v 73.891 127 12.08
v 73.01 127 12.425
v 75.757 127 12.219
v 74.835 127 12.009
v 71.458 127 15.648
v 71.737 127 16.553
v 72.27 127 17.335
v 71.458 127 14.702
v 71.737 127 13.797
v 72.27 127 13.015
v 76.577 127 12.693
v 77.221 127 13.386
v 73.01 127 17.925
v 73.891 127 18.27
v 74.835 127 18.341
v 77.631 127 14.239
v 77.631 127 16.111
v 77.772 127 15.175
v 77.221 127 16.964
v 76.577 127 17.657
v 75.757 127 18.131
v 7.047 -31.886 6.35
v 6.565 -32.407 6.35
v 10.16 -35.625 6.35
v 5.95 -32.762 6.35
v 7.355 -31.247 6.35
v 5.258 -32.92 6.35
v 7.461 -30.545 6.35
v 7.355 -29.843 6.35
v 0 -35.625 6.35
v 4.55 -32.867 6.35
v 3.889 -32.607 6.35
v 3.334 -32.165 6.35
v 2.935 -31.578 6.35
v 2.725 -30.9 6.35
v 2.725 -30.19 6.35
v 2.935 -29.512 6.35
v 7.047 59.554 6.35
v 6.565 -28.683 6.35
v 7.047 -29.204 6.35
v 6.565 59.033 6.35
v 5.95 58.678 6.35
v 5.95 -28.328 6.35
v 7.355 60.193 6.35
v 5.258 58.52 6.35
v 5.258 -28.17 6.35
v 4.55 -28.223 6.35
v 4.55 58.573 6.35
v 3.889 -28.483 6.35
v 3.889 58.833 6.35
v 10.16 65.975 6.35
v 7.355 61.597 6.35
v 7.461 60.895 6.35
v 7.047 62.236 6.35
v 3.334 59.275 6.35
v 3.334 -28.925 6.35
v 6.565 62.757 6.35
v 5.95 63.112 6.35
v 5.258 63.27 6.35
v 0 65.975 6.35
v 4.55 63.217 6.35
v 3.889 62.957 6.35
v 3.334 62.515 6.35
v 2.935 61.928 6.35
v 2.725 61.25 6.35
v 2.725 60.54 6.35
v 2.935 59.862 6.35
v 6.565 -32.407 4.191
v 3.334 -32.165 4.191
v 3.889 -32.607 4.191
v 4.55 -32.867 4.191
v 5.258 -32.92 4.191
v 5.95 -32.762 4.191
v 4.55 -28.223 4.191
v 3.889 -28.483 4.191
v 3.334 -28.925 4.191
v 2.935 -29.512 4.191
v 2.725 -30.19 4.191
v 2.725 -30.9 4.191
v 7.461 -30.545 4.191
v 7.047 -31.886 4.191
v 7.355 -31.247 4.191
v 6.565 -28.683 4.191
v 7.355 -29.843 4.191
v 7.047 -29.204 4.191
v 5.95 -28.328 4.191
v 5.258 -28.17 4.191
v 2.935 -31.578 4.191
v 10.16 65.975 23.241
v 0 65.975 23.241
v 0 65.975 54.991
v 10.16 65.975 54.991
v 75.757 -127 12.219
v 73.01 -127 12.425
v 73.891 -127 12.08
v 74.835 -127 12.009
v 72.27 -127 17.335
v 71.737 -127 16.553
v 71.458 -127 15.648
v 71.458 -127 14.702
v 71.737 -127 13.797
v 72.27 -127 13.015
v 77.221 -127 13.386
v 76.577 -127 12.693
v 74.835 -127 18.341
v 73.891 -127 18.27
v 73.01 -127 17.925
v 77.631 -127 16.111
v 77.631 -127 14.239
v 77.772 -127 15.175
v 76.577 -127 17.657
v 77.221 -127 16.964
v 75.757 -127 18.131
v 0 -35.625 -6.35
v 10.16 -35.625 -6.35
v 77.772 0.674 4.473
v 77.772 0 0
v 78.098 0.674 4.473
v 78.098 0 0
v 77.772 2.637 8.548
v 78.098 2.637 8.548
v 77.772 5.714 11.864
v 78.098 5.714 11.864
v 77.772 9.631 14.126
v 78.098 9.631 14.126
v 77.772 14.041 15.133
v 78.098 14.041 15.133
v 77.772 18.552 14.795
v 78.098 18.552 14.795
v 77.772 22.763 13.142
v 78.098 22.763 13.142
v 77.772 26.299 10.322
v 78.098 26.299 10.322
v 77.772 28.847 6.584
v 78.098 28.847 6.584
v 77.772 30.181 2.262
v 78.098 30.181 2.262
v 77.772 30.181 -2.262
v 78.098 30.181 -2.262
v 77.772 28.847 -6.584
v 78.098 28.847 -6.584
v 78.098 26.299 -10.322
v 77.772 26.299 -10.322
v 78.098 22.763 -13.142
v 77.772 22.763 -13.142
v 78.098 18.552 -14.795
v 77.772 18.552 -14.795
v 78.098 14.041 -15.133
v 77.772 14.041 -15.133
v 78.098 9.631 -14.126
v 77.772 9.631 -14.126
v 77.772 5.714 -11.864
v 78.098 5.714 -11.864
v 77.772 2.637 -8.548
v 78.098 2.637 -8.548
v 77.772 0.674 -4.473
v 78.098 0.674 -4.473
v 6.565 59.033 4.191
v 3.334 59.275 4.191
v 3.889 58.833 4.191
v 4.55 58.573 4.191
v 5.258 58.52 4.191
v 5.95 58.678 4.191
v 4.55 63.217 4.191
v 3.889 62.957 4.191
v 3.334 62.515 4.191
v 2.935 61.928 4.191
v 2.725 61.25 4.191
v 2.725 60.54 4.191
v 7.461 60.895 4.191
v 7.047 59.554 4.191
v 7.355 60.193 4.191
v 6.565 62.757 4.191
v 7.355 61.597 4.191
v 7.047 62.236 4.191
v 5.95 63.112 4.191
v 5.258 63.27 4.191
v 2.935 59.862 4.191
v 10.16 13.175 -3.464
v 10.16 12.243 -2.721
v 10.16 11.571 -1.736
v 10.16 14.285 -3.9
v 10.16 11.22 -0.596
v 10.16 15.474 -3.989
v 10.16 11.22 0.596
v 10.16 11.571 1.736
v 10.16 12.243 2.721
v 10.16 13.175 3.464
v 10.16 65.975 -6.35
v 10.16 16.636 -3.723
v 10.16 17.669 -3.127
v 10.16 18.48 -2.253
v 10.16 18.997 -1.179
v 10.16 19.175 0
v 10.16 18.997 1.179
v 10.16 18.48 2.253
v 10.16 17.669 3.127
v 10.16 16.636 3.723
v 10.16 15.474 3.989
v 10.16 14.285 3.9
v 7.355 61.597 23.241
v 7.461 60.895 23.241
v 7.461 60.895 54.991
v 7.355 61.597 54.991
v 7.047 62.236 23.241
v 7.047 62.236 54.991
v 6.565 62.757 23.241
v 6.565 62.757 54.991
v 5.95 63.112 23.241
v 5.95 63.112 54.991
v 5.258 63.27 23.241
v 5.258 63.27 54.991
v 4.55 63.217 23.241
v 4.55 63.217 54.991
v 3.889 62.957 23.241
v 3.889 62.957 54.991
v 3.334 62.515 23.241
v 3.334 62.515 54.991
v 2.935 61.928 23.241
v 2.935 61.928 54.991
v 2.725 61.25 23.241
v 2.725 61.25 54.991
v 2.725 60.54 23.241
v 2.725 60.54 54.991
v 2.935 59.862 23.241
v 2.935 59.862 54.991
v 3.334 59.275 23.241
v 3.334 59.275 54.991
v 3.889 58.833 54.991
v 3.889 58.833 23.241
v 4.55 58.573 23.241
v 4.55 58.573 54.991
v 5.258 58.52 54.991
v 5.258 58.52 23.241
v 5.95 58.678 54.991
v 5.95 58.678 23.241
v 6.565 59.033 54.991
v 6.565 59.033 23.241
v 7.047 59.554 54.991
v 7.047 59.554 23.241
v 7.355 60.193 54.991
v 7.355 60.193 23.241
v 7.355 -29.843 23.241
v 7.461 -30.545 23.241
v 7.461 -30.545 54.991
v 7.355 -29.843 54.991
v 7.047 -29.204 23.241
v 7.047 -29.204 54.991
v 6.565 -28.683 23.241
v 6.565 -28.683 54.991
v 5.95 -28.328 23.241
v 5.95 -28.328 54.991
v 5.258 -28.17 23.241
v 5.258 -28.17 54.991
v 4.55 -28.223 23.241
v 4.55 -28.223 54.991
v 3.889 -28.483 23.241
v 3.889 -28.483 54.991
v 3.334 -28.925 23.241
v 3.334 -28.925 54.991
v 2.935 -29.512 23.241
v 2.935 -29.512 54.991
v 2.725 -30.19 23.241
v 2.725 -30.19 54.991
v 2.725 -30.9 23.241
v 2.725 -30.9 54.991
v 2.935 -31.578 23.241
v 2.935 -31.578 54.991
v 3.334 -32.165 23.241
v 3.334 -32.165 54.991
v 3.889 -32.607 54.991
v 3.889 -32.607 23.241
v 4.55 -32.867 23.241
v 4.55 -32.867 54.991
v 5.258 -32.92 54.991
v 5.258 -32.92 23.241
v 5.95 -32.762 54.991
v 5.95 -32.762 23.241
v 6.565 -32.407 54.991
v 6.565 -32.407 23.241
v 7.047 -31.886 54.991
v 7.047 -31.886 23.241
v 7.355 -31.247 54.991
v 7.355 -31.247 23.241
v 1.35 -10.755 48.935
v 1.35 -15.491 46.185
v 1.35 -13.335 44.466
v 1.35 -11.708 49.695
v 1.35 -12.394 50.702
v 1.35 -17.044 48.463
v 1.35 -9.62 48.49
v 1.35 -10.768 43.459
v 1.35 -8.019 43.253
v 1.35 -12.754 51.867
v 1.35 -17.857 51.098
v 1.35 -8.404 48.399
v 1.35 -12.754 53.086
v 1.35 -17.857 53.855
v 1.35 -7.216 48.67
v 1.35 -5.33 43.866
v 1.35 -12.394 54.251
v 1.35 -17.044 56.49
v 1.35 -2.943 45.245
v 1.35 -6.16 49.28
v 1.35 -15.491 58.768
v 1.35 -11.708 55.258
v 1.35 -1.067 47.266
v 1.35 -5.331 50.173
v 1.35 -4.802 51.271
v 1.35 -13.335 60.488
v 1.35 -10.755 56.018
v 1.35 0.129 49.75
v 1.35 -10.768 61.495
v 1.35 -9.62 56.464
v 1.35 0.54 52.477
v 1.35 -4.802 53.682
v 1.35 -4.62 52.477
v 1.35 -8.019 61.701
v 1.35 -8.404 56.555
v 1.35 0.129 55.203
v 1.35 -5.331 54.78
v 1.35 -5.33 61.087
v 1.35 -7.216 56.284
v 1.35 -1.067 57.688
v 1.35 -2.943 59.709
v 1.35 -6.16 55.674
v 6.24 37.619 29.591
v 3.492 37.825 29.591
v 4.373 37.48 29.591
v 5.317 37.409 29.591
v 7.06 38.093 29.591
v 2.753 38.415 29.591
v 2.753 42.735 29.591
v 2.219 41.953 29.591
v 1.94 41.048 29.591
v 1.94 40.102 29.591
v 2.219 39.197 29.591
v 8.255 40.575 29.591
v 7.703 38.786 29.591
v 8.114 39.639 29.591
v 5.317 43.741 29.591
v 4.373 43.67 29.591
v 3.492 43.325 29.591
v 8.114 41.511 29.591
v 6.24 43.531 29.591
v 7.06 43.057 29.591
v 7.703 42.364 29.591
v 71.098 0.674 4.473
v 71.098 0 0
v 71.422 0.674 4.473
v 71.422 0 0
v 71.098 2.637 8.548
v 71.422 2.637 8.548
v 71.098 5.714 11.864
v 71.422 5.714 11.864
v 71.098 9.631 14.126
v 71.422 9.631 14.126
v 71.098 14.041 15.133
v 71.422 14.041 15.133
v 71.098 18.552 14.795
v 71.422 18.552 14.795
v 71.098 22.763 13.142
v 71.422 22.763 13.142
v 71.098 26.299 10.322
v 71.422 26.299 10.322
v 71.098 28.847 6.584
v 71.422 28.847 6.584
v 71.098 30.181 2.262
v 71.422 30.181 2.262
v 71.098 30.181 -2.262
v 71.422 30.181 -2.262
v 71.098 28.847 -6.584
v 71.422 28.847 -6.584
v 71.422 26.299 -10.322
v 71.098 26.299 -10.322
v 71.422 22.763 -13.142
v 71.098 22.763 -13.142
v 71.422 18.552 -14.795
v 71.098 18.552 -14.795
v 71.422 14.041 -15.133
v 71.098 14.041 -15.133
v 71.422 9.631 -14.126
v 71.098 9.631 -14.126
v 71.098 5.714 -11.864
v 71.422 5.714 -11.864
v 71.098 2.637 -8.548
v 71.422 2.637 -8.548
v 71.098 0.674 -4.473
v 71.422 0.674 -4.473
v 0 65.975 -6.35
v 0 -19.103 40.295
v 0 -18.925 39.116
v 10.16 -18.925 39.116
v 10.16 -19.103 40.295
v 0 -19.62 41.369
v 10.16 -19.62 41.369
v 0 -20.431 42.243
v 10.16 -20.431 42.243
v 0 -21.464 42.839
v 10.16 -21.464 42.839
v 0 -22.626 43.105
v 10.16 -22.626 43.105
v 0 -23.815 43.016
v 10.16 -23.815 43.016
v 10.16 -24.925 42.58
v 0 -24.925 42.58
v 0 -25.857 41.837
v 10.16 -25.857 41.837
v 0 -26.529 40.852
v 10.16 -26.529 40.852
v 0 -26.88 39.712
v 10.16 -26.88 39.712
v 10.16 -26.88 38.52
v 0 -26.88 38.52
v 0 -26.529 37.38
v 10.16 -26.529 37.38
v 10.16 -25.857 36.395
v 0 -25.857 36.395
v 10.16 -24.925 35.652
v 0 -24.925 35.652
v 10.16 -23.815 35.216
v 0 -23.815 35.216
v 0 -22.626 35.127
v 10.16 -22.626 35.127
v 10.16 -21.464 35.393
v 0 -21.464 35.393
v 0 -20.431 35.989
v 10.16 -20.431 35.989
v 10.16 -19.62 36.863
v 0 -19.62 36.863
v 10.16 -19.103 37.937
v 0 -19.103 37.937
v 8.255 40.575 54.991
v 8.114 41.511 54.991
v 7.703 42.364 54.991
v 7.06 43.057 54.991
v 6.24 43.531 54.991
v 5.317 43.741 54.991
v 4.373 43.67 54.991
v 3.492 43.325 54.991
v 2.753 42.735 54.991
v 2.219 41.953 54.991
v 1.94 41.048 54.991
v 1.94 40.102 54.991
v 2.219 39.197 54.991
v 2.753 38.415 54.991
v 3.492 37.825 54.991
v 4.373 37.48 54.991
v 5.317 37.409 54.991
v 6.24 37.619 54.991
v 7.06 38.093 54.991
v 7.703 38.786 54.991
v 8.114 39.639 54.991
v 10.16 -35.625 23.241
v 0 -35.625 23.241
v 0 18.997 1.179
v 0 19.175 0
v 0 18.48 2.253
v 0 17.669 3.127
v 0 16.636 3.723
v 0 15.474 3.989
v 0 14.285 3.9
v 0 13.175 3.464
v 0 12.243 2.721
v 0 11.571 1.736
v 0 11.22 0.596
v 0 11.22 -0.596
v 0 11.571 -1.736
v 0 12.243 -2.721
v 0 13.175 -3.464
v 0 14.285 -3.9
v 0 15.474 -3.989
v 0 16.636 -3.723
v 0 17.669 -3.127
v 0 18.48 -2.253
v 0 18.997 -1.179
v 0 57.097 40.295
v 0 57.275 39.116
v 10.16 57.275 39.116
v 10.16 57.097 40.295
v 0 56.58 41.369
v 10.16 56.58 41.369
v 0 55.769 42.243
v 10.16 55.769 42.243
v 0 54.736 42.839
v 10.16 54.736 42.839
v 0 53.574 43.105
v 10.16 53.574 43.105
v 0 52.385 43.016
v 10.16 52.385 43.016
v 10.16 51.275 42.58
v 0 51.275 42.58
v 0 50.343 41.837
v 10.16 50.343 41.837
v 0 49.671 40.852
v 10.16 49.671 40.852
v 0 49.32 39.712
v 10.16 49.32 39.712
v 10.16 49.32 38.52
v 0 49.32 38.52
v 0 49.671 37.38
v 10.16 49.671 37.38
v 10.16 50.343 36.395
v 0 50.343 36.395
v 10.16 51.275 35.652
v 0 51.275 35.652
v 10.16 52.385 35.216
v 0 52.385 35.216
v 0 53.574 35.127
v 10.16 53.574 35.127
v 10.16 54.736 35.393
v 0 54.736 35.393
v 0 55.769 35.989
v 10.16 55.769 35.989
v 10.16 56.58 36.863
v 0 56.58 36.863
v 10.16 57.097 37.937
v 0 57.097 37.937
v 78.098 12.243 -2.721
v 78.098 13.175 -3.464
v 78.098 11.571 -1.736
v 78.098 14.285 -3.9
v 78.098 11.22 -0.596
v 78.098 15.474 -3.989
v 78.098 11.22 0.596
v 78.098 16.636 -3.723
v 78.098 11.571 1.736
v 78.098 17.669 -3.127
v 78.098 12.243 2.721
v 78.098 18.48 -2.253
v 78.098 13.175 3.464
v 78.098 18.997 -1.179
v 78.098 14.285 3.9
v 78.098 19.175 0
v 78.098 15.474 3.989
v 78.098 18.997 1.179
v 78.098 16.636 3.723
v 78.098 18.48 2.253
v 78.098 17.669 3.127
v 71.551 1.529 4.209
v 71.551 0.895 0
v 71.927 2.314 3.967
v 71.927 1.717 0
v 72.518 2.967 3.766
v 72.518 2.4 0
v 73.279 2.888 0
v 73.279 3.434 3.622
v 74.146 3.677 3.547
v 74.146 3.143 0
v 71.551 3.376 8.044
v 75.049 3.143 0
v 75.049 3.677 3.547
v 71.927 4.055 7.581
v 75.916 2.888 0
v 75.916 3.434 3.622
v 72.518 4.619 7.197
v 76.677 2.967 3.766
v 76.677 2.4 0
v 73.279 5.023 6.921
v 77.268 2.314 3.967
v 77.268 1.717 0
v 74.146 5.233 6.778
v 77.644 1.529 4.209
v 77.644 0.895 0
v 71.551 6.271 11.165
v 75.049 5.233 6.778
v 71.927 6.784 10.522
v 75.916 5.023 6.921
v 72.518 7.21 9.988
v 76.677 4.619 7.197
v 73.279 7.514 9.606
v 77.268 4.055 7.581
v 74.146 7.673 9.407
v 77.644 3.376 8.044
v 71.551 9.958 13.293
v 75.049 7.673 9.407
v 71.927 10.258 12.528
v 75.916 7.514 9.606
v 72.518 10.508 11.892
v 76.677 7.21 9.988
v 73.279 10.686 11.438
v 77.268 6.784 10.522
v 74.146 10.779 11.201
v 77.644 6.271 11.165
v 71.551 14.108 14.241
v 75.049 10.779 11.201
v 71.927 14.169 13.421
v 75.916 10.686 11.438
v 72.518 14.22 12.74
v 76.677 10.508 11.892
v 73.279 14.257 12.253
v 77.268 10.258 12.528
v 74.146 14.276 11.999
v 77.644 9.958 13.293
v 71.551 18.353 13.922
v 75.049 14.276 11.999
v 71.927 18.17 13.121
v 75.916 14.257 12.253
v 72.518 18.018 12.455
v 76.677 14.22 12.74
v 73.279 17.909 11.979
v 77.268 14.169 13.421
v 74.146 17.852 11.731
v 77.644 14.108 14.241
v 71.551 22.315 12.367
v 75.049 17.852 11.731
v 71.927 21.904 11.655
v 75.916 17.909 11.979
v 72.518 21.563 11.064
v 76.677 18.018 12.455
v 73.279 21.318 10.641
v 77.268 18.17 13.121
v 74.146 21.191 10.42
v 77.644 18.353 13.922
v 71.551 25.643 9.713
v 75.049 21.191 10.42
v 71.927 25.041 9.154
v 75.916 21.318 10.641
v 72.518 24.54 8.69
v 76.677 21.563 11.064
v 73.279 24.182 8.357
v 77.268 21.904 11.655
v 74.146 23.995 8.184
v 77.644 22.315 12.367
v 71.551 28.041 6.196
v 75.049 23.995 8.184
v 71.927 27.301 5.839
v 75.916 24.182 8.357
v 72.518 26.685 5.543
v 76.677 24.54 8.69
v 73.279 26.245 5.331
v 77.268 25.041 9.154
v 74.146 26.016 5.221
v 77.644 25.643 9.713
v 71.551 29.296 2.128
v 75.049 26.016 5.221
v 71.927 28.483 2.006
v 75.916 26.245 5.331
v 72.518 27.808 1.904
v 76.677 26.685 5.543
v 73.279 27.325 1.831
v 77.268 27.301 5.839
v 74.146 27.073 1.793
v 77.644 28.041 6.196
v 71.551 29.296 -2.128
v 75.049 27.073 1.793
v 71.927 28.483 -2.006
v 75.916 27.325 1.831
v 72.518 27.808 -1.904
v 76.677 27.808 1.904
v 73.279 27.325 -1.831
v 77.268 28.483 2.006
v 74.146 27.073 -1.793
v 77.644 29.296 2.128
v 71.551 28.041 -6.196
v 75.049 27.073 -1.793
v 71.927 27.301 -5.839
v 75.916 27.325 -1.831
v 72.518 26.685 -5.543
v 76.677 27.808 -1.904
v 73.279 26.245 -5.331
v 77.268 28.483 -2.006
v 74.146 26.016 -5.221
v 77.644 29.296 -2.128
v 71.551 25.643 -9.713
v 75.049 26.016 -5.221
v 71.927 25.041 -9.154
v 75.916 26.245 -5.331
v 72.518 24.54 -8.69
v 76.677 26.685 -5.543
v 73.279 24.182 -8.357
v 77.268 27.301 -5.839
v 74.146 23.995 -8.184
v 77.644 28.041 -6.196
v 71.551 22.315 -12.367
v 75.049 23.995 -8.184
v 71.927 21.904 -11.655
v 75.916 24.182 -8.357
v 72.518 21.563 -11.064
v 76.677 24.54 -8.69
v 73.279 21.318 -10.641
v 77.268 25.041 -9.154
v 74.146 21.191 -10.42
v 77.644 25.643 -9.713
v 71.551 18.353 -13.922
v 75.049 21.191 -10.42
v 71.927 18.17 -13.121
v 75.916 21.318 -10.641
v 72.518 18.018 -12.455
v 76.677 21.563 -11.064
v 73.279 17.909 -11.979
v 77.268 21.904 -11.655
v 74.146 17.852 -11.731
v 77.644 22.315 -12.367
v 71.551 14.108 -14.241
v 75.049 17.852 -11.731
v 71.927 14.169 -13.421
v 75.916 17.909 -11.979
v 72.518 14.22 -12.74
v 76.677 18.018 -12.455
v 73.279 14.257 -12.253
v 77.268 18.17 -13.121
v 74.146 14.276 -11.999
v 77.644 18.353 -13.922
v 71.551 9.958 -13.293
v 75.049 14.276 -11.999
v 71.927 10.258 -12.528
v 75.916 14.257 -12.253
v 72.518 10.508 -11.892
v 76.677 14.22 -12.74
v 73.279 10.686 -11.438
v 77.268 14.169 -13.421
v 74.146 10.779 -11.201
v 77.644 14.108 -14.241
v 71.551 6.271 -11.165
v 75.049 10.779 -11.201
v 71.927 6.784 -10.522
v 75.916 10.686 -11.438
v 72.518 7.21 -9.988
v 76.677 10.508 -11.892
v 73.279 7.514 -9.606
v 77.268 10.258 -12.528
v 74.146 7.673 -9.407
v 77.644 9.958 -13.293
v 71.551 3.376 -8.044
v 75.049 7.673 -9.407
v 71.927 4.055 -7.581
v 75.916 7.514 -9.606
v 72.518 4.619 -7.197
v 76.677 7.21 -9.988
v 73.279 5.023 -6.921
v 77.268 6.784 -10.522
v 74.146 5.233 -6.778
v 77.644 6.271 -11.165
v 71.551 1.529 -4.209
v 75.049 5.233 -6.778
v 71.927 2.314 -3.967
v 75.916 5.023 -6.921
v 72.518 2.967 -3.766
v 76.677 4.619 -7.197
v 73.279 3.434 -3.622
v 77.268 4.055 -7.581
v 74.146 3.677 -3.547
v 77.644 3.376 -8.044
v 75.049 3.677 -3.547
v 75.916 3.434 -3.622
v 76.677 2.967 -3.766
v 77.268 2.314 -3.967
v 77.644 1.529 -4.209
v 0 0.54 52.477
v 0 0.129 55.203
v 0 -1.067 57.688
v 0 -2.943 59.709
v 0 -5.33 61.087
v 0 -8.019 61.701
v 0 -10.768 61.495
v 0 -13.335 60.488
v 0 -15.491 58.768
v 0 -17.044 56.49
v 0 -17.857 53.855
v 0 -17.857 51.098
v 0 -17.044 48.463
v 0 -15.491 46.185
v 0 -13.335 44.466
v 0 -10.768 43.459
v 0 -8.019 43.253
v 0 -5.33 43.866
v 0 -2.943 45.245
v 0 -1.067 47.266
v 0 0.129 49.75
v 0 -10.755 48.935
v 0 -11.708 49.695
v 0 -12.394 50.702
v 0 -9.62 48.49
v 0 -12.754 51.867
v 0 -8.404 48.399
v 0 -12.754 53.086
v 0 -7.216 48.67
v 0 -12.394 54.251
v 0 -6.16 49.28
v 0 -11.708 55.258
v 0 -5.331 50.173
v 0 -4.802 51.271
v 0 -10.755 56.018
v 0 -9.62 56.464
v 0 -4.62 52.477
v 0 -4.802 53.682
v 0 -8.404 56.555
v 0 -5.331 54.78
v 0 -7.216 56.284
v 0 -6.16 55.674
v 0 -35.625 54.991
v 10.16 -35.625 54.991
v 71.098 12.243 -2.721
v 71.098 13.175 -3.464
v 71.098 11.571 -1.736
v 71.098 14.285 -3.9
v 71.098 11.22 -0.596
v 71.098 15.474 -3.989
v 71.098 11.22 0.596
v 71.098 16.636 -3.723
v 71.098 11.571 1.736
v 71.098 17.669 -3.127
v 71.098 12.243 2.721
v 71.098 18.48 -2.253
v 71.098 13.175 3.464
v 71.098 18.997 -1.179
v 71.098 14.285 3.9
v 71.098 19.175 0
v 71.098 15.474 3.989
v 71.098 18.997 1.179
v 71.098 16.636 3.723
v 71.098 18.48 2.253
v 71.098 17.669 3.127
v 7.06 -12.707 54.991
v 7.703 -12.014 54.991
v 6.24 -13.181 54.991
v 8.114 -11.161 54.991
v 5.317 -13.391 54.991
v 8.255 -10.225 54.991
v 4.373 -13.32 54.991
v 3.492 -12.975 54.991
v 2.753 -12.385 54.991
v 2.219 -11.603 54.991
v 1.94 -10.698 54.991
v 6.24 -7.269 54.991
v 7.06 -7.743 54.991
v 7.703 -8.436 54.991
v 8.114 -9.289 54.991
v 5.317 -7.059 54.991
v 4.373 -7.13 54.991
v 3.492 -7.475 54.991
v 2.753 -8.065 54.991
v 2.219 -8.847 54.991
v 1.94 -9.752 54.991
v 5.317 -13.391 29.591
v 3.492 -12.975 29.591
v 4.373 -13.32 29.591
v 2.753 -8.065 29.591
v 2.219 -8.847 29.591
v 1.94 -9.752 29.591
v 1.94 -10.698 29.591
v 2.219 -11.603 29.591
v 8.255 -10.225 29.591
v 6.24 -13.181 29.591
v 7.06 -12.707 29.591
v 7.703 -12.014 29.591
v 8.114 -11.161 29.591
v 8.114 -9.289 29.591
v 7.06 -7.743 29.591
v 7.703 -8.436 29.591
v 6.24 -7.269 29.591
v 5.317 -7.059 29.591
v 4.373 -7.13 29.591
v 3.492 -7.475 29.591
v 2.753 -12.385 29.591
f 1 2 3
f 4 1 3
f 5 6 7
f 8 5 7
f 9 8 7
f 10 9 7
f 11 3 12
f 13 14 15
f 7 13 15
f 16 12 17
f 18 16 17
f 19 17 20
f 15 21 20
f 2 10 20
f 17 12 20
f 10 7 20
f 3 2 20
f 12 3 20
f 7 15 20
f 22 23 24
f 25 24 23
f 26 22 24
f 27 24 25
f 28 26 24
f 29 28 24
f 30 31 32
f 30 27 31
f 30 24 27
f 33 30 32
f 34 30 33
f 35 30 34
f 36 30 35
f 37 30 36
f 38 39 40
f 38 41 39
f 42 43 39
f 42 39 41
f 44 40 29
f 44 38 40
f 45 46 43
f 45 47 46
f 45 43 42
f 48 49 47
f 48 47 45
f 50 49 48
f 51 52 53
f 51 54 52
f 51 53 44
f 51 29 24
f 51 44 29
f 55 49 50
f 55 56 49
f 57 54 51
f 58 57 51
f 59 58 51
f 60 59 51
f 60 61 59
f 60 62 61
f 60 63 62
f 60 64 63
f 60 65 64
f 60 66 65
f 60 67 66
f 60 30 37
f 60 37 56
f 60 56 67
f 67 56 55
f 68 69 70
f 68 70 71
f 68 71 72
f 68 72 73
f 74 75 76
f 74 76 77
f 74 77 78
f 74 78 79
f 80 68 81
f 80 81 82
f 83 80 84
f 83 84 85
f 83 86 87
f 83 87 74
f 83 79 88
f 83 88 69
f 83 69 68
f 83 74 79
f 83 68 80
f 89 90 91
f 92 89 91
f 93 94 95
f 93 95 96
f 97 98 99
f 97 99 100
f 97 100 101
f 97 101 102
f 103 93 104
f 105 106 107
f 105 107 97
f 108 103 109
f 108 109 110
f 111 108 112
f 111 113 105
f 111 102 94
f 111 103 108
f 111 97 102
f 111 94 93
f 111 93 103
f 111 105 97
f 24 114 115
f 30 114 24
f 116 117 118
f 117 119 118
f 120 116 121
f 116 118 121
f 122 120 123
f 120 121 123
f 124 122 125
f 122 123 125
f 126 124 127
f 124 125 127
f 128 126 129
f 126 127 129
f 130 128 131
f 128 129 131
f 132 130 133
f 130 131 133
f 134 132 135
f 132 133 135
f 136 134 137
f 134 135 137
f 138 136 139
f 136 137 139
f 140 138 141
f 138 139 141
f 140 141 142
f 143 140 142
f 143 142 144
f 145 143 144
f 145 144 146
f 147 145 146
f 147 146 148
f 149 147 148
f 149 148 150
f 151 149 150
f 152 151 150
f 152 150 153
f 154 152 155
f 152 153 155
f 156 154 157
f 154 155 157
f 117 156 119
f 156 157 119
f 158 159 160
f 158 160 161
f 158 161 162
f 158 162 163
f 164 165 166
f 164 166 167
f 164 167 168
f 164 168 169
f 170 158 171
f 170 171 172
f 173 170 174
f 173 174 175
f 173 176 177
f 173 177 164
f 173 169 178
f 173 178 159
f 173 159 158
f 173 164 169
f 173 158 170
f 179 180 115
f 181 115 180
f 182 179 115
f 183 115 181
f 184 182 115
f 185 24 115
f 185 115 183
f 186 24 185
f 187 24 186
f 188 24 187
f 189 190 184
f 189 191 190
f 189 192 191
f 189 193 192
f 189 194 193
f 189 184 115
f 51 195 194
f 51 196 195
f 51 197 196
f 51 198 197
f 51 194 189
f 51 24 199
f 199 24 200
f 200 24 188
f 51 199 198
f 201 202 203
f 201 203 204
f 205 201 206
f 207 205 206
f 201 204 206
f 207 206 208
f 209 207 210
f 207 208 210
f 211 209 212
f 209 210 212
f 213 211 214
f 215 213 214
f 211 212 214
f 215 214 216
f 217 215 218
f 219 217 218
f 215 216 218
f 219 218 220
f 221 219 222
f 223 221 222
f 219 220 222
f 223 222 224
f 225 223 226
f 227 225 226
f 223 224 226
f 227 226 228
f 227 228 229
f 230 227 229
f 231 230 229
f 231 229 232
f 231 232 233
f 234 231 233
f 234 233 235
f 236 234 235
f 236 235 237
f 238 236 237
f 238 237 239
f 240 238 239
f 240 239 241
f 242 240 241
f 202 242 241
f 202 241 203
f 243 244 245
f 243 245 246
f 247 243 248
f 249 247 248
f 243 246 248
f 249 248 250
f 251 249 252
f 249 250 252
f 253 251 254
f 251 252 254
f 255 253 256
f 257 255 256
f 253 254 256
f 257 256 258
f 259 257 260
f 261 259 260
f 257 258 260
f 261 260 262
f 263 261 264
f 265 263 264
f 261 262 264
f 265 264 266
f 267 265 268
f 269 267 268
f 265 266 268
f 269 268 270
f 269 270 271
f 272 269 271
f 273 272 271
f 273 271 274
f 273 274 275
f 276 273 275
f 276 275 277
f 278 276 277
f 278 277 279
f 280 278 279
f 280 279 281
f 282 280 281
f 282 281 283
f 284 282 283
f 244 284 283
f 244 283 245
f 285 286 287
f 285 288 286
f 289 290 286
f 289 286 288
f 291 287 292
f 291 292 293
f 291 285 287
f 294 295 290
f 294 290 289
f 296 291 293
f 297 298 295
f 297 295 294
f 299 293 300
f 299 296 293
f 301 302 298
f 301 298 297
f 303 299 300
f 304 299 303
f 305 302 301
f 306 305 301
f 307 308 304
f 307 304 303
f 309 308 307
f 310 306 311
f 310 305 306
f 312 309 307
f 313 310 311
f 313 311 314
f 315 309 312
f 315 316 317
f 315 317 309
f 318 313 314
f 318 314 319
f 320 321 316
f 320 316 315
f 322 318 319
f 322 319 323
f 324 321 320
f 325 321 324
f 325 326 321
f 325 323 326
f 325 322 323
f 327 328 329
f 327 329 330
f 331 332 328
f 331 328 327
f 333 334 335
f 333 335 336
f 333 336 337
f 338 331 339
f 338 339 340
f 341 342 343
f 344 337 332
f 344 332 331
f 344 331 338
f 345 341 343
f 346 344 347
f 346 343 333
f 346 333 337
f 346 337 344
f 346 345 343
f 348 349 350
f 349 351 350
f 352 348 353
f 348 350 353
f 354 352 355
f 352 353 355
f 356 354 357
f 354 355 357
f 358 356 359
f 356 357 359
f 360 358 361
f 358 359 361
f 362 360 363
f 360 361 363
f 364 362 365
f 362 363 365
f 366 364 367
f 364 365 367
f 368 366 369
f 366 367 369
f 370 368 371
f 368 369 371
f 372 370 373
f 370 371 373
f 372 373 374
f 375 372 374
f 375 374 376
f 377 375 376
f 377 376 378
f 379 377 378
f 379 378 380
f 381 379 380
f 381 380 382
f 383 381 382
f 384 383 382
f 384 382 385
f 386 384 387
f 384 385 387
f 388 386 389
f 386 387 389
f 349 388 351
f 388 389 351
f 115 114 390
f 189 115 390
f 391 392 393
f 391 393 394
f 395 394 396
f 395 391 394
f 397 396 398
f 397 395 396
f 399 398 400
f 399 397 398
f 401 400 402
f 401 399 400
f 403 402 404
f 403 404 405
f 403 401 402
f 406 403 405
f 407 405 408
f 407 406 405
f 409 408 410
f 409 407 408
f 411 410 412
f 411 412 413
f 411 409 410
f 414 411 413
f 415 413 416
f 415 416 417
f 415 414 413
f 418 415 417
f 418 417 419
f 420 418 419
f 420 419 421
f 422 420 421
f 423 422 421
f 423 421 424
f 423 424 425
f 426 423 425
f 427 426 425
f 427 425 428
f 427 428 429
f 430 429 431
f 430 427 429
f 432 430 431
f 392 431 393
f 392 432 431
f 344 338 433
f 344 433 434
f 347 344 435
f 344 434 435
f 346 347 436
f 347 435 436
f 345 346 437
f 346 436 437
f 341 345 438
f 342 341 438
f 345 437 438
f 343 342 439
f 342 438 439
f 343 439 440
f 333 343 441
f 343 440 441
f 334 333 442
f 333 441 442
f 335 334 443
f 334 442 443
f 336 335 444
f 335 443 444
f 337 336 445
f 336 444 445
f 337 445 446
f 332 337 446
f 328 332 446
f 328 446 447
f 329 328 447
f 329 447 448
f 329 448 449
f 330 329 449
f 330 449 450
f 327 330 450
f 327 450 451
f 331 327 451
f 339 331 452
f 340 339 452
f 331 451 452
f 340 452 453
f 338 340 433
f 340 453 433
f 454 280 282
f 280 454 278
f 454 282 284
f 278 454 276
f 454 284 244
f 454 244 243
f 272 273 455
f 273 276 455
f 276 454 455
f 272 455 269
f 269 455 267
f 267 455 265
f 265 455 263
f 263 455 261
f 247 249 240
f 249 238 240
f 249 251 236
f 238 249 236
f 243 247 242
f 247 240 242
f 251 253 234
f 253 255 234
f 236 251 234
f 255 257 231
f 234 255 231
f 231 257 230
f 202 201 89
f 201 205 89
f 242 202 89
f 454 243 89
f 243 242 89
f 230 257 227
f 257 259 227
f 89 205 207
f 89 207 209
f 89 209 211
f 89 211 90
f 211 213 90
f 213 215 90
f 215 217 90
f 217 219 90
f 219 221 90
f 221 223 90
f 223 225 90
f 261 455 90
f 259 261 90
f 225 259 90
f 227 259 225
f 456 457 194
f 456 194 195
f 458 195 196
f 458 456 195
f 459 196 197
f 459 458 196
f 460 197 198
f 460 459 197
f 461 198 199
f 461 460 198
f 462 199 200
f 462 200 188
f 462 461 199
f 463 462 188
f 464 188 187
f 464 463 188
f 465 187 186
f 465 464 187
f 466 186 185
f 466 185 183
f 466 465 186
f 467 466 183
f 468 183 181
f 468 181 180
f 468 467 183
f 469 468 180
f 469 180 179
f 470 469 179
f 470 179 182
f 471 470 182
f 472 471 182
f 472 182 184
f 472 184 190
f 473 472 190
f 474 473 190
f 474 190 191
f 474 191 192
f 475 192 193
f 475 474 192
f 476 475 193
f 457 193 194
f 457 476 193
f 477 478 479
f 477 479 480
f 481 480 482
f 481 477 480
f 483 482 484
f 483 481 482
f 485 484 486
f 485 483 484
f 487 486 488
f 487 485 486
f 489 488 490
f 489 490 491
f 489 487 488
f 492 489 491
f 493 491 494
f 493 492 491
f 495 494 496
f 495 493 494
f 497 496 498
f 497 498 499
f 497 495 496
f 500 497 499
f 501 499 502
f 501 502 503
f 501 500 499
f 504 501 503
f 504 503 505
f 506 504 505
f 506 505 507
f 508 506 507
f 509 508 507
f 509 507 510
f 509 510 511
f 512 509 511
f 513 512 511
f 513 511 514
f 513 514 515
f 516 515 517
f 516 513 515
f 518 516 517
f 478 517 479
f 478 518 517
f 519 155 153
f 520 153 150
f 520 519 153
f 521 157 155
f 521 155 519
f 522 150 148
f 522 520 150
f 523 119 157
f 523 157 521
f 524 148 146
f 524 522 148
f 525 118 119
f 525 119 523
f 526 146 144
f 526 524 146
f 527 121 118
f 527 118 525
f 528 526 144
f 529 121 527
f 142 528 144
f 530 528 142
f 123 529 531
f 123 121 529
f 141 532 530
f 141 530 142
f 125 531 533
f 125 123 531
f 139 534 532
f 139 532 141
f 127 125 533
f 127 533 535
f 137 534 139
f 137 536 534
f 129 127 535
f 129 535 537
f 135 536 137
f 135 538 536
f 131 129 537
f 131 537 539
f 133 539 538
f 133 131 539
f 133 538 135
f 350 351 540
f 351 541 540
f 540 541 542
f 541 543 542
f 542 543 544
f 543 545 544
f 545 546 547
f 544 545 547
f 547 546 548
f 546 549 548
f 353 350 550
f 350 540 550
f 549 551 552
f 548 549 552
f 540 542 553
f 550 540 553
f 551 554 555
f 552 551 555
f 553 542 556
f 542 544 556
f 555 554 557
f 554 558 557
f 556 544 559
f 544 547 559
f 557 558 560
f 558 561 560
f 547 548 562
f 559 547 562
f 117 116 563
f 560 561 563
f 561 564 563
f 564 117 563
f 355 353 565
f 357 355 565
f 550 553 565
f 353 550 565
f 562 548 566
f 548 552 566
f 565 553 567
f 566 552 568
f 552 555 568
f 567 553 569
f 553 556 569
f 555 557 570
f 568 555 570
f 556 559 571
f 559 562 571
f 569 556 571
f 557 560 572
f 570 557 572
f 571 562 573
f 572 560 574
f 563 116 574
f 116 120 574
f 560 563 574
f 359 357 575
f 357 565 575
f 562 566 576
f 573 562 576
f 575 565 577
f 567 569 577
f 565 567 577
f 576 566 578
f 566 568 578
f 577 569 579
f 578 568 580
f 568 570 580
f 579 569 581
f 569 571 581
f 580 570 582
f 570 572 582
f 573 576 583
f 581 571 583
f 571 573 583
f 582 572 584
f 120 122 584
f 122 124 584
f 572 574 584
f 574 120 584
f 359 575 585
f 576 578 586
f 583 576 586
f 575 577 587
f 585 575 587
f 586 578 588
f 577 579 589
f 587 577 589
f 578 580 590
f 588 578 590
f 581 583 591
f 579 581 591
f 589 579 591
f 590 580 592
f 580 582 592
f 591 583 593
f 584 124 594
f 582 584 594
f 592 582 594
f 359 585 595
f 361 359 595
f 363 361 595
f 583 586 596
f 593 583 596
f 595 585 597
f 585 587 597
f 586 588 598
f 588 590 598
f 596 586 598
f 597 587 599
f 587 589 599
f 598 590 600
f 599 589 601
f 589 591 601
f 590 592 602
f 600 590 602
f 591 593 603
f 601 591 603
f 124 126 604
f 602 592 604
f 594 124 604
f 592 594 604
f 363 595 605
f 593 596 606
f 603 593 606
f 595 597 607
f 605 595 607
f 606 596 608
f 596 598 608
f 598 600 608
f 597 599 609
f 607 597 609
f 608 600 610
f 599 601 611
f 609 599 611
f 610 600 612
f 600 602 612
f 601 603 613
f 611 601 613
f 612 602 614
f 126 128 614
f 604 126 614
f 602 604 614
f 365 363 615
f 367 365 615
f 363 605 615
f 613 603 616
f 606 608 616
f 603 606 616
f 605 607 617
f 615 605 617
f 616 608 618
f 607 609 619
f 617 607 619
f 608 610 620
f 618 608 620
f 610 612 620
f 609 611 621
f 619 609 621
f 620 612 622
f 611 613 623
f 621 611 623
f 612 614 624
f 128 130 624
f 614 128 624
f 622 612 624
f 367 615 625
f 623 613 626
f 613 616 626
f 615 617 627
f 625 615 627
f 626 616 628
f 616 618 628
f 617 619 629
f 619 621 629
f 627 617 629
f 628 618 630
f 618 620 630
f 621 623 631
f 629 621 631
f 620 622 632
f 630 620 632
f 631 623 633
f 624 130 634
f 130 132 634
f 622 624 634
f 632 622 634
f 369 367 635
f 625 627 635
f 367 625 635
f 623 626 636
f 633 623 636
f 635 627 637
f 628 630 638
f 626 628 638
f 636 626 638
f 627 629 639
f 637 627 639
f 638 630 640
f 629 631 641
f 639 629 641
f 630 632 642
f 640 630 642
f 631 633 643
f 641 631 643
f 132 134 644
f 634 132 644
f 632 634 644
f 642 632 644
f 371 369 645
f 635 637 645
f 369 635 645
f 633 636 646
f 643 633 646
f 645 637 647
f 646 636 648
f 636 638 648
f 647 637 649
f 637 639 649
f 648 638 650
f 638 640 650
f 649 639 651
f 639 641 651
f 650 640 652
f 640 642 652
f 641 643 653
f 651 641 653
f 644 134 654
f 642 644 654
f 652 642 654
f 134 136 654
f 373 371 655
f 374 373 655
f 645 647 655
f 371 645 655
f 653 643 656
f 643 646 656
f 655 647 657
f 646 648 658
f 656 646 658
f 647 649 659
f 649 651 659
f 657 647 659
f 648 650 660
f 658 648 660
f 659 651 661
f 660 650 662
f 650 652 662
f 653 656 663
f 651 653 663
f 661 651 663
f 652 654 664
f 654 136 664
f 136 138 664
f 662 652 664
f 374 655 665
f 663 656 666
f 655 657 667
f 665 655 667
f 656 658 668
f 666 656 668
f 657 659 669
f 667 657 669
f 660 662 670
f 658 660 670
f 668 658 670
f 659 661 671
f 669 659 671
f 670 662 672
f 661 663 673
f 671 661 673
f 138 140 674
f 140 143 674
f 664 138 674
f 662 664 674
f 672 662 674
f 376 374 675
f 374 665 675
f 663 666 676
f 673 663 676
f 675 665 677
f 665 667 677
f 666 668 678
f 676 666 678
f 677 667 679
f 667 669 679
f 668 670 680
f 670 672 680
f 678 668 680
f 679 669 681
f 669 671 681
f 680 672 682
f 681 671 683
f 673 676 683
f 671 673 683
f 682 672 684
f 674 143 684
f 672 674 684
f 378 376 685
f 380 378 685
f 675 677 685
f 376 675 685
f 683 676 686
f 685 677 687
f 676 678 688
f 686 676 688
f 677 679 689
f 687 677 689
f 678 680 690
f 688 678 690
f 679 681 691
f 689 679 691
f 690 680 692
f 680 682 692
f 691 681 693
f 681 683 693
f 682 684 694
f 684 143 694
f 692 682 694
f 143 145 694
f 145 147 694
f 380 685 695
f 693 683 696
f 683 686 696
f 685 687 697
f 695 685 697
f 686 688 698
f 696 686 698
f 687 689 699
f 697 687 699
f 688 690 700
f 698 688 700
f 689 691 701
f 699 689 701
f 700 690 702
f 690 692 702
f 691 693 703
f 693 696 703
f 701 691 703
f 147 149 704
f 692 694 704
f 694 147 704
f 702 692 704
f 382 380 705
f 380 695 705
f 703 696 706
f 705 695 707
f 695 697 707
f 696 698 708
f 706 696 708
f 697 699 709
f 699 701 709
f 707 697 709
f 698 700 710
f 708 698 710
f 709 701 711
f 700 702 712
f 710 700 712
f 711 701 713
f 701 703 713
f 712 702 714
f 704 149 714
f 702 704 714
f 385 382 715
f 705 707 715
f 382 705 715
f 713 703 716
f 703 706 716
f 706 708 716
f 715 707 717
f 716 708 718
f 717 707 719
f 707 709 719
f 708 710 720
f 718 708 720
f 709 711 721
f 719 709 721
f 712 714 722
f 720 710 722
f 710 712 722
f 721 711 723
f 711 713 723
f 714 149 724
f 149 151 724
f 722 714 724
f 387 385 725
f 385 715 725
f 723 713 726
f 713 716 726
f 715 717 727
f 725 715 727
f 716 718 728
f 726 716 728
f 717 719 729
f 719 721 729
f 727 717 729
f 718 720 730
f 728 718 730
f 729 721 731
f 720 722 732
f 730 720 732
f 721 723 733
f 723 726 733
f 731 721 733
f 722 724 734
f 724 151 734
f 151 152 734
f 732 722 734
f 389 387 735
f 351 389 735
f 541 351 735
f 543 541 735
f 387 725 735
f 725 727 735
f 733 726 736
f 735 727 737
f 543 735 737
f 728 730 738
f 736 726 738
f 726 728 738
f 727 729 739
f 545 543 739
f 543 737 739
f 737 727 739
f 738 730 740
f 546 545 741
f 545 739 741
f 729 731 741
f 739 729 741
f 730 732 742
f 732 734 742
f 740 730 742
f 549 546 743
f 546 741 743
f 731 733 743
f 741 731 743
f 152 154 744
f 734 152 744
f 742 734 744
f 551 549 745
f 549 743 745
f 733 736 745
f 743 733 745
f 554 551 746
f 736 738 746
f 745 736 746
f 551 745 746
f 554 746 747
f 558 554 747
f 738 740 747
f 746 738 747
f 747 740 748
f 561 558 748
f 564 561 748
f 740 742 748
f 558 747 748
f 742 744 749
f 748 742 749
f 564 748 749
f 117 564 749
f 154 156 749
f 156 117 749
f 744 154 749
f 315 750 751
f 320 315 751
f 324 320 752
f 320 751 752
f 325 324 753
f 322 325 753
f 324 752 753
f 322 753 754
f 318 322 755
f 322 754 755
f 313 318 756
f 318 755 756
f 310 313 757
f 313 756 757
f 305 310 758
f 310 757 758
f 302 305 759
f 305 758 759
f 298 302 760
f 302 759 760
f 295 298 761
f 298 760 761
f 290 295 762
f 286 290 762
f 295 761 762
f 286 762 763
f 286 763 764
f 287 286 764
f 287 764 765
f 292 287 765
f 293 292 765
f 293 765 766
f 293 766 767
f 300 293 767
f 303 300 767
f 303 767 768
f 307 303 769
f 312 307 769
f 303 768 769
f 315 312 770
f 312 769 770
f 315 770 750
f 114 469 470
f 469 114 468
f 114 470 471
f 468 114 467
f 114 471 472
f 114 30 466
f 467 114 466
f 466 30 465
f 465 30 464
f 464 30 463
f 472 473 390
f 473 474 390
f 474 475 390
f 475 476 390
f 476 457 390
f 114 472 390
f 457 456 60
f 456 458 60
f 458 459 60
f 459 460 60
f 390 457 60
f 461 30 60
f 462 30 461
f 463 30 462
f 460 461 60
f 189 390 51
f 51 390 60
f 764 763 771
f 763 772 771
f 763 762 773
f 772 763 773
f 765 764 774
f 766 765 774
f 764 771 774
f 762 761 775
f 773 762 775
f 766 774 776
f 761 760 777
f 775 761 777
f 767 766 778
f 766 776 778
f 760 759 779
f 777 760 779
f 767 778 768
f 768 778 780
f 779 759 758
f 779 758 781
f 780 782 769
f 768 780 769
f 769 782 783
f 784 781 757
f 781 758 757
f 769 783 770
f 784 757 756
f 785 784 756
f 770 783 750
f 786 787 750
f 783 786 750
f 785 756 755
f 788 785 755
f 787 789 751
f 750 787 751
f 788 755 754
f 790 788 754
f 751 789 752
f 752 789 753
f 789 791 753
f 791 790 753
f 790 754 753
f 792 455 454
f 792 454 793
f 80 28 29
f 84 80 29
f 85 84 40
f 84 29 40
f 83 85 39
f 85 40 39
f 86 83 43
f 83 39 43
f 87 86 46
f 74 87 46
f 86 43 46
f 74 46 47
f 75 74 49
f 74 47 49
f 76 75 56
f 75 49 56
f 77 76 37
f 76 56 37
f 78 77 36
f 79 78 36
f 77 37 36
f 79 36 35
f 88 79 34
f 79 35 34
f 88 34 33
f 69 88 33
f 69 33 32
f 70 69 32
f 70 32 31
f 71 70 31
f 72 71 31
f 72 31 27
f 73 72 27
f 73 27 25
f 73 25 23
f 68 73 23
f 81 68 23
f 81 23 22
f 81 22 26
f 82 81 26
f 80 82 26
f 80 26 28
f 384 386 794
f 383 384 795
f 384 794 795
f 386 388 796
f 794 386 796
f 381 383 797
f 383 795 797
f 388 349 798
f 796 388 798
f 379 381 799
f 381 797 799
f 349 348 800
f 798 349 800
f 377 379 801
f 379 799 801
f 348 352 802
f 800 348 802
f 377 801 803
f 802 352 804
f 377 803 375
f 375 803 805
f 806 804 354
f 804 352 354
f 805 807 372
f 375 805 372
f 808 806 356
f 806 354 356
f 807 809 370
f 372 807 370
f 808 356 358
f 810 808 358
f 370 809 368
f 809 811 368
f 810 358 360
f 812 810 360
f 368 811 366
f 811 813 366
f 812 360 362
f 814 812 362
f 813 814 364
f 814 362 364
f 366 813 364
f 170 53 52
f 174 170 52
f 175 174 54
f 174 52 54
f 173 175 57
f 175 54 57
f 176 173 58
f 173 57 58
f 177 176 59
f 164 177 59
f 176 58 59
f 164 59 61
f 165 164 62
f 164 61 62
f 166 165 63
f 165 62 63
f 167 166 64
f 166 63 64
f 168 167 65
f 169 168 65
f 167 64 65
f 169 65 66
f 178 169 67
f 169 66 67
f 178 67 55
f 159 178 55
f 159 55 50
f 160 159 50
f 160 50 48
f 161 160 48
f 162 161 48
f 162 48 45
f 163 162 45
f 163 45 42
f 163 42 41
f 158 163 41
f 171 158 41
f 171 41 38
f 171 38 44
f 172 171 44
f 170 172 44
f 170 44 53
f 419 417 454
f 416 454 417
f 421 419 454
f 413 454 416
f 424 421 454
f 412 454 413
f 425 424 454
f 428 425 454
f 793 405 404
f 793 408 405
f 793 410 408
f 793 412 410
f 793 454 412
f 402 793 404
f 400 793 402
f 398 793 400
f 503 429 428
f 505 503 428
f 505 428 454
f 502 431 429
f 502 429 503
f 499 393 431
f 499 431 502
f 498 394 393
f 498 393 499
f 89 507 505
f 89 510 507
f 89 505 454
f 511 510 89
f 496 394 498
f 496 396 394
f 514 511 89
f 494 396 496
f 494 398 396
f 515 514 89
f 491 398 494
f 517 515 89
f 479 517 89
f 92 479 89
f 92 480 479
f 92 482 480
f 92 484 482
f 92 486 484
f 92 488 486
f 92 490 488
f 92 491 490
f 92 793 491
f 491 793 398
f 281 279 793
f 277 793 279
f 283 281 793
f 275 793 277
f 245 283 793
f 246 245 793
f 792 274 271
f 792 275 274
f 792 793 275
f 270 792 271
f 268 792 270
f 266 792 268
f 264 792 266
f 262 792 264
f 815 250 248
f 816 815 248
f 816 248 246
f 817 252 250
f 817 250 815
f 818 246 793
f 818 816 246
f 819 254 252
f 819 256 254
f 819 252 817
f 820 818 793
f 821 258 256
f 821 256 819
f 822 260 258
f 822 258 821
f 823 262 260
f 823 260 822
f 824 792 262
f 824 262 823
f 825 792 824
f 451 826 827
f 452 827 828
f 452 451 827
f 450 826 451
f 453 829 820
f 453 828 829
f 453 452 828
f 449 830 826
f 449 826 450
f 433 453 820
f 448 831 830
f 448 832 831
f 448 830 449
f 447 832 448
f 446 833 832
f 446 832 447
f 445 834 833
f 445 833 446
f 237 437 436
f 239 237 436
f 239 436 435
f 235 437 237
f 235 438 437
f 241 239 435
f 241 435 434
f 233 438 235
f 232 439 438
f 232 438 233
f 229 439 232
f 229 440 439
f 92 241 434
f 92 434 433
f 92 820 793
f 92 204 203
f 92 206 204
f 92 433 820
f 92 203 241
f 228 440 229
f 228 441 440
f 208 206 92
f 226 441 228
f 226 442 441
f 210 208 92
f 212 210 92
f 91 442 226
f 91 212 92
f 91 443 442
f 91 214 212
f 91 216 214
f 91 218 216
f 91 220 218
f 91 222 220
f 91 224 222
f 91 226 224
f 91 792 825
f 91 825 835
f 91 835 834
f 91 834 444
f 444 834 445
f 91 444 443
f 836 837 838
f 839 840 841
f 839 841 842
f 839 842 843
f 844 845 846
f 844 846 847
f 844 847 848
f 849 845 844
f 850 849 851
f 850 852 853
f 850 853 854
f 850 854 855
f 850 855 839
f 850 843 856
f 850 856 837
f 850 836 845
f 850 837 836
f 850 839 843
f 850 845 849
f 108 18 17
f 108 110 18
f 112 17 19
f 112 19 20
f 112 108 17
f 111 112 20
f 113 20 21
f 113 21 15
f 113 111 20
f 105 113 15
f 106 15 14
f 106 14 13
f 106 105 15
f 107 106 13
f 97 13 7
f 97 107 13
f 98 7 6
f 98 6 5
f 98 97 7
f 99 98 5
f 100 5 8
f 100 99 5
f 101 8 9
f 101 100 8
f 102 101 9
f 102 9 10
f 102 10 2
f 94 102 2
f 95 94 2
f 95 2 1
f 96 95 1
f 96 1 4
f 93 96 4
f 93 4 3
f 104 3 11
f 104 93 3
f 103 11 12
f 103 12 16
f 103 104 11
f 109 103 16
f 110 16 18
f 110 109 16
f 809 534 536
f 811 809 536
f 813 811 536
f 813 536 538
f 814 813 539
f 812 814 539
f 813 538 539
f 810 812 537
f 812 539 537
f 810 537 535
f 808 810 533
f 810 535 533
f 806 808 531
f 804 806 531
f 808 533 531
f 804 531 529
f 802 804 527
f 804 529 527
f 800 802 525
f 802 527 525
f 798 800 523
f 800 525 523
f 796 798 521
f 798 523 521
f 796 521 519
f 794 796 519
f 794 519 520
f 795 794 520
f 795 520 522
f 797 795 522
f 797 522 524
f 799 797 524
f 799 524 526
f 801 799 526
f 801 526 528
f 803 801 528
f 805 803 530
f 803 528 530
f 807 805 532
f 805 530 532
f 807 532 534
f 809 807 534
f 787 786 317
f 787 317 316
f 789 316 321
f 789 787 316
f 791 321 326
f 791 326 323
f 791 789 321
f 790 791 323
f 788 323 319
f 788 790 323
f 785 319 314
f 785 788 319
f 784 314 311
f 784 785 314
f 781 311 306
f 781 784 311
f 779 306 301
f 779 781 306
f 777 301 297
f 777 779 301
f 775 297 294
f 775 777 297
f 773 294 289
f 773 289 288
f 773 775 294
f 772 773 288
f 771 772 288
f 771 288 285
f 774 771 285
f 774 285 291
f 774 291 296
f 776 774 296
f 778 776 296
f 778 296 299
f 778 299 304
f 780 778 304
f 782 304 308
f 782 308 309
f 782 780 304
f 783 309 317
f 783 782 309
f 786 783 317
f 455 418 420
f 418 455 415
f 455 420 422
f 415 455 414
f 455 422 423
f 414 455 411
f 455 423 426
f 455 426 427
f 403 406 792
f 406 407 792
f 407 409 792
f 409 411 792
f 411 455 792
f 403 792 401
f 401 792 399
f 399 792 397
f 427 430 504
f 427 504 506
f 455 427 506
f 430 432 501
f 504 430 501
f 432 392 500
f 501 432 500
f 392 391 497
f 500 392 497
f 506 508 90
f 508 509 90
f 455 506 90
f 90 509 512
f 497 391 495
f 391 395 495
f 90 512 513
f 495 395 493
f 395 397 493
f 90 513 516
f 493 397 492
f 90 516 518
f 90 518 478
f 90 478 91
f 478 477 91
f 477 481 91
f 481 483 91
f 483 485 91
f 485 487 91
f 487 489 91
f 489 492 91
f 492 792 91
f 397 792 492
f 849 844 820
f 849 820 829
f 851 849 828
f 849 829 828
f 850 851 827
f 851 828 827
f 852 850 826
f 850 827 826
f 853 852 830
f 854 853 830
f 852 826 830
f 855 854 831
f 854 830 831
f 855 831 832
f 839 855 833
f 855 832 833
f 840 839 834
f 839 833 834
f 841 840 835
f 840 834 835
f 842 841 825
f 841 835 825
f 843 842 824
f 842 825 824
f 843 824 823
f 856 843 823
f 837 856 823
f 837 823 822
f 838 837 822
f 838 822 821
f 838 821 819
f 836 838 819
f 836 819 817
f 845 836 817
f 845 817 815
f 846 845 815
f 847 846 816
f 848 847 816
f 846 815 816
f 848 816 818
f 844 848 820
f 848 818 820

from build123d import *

# Parameters (mm, degrees)
F3_R      = 11
F3_R_2    = 4
F4_DEPTH  = 7
F5_R      = 3.175
F6_DEPTH  = 127
F7_W      = 101.6
F7_H      = 12.7
F7_R      = 4
F8_DEPTH  = 10.16
F7_H_2    = 31.75
F11_R     = 9.25
F11_R_2   = 4.0894
F12_DEPTH = 1.35
F9_R      = 2.38125
F13_DEPTH = 50.8
F9_R_2    = 3.175
F14_DEPTH = 25.4


with BuildPart() as f1:
    # F0 (on Top) → F1 (revolve)
    with BuildSketch(Plane.XY):
        with BuildLine():
            ThreePointArc((71.4225, 0), (74.5975, 3.175), (77.7725, 0))
            Line((77.7725, 0), (78.0975, 0))
            Line((78.0975, 0), (78.0975, 3.175))
            Line((78.0975, 3.175), (78.0975, 4.175))
            Line((78.0975, 4.175), (74.5975, 4.175))
            Line((74.5975, 4.175), (71.0975, 4.175))
            Line((71.0975, 4.175), (71.0975, 3.175))
            Line((71.0975, 3.175), (71.0975, 0))
            Line((71.0975, 0), (71.4225, 0))
        make_face()
        Polygon((74.5975, 4.175), (78.0975, 4.175), (78.0975, 15.175), (71.0975, 15.175), (71.0975, 4.175), align=None)
    revolve(axis=Axis((74.5975, 15.175, 0), (-1, 0, 0)))

    # F0 (on Top) → F2 (revolve, cut)
    with BuildSketch(Plane.XY):
        Polygon((74.5975, 4.175), (78.0975, 4.175), (78.0975, 15.175), (71.0975, 15.175), (71.0975, 4.175), align=None)
    revolve(axis=Axis((74.5975, 15.175, 0), (-1, 0, 0)), mode=Mode.SUBTRACT)

    # F3 (on face) → F4 (join)
    with BuildSketch(Plane.YZ.offset(78.0975)):
        with Locations((15.175, 0)):
            Circle(F3_R)
        with Locations((15.175, 0)):
            Circle(F3_R_2, mode=Mode.SUBTRACT)
    extrude(amount=-F4_DEPTH)


with BuildPart() as f6:
    # F5 (on Front) → F6 (new body, symmetric)
    with BuildSketch(Plane.XZ):
        with Locations((74.5975, 15.175)):
            Circle(F5_R)
    extrude(amount=F6_DEPTH, both=True)


with BuildPart() as f8:
    # F7 (on Right) → F8 (new body)
    with BuildSketch(Plane.YZ):
        with Locations((15.175, 0)):
            Rectangle(F7_W, F7_H)
        with Locations((15.175, 0)):
            Circle(F7_R, mode=Mode.SUBTRACT)
    extrude(amount=F8_DEPTH)


with BuildPart() as f8b:
    # F7 (on Right) → F8, piece 2 (new body)
    with BuildSketch(Plane.YZ):
        with Locations((15.175, 39.116)):
            Rectangle(F7_W, F7_H_2)
        with Locations((-22.925, 39.116)):
            Circle(F7_R, mode=Mode.SUBTRACT)
        with Locations((53.275, 39.116)):
            Circle(F7_R, mode=Mode.SUBTRACT)
    extrude(amount=F8_DEPTH)


with BuildPart() as f12:
    # F11 (on Right) → F12 (new body)
    with BuildSketch(Plane.YZ):
        with Locations((-8.7098954245, 52.4768084288)):
            Circle(F11_R)
        with Locations((-8.7098954245, 52.4768084288)):
            Circle(F11_R_2, mode=Mode.SUBTRACT)
    extrude(amount=F12_DEPTH)


with BuildPart() as f13_tool:
    # F9 (on face) → F13 (new body)
    with BuildSketch(Plane.XY.offset(54.991)):
        with Locations((5.08, 60.895)):
            Circle(F9_R)
        with Locations((5.08, -30.545)):
            Circle(F9_R)
    extrude(amount=-F13_DEPTH)


with BuildPart() as f8_1:
    add(f8.part)

    # F13: cut by f13_tool
    add(f13_tool.part, mode=Mode.SUBTRACT)


with BuildPart() as f8b_1:
    add(f8b.part)

    # F13: cut by f13_tool
    add(f13_tool.part, mode=Mode.SUBTRACT)

    # F9 (on face) → F14 (cut)
    with BuildSketch(Plane.XY.offset(54.991)):
        with Locations((5.08, 40.575)):
            Circle(F9_R_2)
        with Locations((5.08, -10.225)):
            Circle(F9_R_2)
    extrude(amount=-F14_DEPTH, mode=Mode.SUBTRACT)


solid = Compound([f1.part, f6.part, f12.part, f8_1.part, f8b_1.part])
